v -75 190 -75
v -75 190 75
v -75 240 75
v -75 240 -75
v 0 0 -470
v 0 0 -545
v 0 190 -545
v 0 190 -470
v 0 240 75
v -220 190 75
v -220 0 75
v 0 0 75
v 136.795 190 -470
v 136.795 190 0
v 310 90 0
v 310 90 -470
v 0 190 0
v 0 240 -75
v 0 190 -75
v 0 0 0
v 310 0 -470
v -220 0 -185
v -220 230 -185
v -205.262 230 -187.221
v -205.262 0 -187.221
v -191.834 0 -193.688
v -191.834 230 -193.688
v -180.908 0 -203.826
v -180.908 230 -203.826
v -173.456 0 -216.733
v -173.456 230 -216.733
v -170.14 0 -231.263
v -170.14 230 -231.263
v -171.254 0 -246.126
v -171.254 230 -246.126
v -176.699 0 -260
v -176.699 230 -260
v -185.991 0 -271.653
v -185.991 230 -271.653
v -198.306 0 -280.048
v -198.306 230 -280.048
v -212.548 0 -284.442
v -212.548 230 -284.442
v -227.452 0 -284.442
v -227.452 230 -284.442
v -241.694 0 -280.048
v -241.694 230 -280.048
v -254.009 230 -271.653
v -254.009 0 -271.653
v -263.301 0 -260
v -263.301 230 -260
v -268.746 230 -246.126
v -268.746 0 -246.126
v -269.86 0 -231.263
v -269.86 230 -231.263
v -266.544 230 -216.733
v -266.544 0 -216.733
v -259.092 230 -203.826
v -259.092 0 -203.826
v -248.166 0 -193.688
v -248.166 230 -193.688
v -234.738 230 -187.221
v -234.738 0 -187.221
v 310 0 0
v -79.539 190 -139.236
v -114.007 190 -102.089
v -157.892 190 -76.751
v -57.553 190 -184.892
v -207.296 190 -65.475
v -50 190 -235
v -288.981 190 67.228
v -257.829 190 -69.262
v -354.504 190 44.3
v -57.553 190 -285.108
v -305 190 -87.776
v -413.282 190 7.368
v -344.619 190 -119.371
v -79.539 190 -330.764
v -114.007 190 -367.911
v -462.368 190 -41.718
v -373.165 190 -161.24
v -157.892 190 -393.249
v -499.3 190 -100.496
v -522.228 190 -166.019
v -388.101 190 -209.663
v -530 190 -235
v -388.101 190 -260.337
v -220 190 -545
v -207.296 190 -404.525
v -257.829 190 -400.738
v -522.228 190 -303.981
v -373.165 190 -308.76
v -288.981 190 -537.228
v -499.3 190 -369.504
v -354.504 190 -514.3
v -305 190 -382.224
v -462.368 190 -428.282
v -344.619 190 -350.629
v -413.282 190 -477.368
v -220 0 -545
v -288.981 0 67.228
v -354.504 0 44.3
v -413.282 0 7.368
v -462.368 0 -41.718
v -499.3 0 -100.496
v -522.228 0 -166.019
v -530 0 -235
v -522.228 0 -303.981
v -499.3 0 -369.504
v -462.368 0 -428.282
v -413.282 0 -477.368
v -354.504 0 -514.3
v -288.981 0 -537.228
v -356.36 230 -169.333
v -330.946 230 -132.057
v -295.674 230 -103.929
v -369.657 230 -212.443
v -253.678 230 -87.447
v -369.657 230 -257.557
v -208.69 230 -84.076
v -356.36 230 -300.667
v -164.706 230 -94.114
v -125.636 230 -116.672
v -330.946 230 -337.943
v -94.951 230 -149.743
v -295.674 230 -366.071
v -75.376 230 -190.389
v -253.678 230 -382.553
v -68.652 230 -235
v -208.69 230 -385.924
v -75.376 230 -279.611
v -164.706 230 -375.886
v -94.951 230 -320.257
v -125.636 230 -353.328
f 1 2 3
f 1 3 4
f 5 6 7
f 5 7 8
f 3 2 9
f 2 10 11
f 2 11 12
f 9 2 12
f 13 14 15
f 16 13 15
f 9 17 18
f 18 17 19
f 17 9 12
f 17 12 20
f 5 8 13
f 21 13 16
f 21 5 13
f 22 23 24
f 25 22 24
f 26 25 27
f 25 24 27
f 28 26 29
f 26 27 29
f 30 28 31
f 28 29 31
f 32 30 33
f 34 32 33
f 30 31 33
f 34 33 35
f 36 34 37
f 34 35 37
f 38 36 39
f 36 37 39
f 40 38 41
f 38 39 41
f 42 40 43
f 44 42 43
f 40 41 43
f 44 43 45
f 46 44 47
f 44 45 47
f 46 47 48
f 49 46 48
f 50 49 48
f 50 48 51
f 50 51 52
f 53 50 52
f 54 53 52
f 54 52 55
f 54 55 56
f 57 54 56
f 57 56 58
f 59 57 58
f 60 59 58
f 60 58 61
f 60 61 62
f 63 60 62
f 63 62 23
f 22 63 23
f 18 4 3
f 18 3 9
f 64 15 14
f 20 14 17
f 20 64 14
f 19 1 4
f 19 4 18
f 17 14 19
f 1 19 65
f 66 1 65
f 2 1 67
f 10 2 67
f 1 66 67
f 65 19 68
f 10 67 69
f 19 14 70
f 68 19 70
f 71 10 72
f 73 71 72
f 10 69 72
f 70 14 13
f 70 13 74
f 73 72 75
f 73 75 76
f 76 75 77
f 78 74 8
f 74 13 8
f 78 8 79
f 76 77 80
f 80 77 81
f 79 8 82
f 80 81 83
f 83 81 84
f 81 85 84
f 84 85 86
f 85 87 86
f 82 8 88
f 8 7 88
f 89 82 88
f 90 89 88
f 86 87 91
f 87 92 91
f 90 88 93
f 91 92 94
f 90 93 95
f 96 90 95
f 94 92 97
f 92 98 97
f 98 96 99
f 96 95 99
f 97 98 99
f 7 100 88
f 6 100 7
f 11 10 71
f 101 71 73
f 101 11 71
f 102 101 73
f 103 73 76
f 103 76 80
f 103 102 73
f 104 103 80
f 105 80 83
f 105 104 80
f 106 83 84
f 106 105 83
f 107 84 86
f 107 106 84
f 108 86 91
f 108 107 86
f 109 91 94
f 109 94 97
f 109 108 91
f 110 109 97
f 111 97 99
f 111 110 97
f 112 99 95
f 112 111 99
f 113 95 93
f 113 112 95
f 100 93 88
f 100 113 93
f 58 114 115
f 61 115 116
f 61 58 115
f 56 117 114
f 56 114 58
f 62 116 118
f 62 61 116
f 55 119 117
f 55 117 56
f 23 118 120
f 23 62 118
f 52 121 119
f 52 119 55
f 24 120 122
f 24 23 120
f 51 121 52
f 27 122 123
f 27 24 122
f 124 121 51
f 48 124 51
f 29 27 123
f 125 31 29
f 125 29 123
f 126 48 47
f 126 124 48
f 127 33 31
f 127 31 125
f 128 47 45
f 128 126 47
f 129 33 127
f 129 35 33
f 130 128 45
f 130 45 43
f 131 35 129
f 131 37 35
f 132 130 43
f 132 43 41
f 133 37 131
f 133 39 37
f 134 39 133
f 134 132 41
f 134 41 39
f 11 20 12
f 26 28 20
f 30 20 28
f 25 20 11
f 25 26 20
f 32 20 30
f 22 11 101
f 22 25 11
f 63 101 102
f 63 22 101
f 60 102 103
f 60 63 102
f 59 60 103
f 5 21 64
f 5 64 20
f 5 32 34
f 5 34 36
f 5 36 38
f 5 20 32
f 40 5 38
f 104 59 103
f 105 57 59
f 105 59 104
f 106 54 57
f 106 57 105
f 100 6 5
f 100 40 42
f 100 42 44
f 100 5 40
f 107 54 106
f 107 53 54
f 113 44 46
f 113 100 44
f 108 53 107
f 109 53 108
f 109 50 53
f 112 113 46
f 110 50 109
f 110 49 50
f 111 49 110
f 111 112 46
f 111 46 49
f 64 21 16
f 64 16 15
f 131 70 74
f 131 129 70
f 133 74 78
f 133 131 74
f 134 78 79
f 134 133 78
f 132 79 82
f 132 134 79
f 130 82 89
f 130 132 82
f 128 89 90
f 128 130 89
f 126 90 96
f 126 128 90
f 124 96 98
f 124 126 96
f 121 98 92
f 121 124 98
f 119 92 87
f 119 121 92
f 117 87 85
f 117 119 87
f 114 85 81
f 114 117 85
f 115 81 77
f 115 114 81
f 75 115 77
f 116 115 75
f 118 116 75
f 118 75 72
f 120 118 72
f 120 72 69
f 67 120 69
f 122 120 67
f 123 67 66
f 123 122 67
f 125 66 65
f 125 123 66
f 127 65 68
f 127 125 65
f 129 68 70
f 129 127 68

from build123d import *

# Parameters (mm, degrees)
BOSS_EXTRUDE1_DEPTH = 190
SKETCH2_R           = 170
BOSS_EXTRUDE2_DEPTH = 40
BOSS_EXTRUDE2_TAPER = 25
SKETCH3_W           = 75
SKETCH3_H           = 150
BOSS_EXTRUDE3_DEPTH = 50
SKETCH4_R           = 50
CUT_EXTRUDE1_DEPTH  = 795.244924441
CUT_EXTRUDE2_DEPTH  = 798.198218764


with BuildPart() as part:
    # Sketch1 → Boss-Extrude1 (new body)
    with BuildSketch(Plane(origin=(0, 0, 0), x_dir=(1, 0, 0), z_dir=(0, 1, 0))):
        with BuildLine():
            Line((0, 0), (0, -75))
            Line((0, -75), (-220, -75))
            ThreePointArc((-220, -75), (-530, 235), (-220, 545))
            Line((-220, 545), (0, 545))
            Line((0, 545), (0, 470))
            Line((0, 470), (310, 470))
            Line((310, 470), (310, 0))
            Line((310, 0), (0, 0))
        make_face()
    extrude(amount=BOSS_EXTRUDE1_DEPTH)

    # Sketch2 → Boss-Extrude2 (add)
    with BuildSketch(Plane(origin=(0, 190, 0), x_dir=(1, 0, 0), z_dir=(0, 1, 0))):
        with Locations((-220, 235)):
            Circle(SKETCH2_R)
    extrude(amount=BOSS_EXTRUDE2_DEPTH, taper=BOSS_EXTRUDE2_TAPER)

    # Sketch3 → Boss-Extrude3 (add)
    with BuildSketch(Plane(origin=(0, 190, 0), x_dir=(1, 0, 0), z_dir=(0, 1, 0))):
        with Locations((-37.5, 0)):
            Rectangle(SKETCH3_W, SKETCH3_H)
    extrude(amount=BOSS_EXTRUDE3_DEPTH)

    # Sketch4 → Cut-Extrude1 (cut, through all)
    with BuildSketch(Plane(origin=(0, 230, 0), x_dir=(1, 0, 0), z_dir=(0, 1, 0))):
        with Locations(Location((-220, 235, 0), (0, 0, 270))):
            Circle(SKETCH4_R)
    extrude(amount=-CUT_EXTRUDE1_DEPTH, mode=Mode.SUBTRACT)

    # Sketch5 → Cut-Extrude2 (cut, through all)
    with BuildSketch(Plane.XY):
        Polygon((310, 190), (136.794919243, 190), (310, 90), align=None)
    extrude(amount=-CUT_EXTRUDE2_DEPTH, mode=Mode.SUBTRACT)


solid = part.part
